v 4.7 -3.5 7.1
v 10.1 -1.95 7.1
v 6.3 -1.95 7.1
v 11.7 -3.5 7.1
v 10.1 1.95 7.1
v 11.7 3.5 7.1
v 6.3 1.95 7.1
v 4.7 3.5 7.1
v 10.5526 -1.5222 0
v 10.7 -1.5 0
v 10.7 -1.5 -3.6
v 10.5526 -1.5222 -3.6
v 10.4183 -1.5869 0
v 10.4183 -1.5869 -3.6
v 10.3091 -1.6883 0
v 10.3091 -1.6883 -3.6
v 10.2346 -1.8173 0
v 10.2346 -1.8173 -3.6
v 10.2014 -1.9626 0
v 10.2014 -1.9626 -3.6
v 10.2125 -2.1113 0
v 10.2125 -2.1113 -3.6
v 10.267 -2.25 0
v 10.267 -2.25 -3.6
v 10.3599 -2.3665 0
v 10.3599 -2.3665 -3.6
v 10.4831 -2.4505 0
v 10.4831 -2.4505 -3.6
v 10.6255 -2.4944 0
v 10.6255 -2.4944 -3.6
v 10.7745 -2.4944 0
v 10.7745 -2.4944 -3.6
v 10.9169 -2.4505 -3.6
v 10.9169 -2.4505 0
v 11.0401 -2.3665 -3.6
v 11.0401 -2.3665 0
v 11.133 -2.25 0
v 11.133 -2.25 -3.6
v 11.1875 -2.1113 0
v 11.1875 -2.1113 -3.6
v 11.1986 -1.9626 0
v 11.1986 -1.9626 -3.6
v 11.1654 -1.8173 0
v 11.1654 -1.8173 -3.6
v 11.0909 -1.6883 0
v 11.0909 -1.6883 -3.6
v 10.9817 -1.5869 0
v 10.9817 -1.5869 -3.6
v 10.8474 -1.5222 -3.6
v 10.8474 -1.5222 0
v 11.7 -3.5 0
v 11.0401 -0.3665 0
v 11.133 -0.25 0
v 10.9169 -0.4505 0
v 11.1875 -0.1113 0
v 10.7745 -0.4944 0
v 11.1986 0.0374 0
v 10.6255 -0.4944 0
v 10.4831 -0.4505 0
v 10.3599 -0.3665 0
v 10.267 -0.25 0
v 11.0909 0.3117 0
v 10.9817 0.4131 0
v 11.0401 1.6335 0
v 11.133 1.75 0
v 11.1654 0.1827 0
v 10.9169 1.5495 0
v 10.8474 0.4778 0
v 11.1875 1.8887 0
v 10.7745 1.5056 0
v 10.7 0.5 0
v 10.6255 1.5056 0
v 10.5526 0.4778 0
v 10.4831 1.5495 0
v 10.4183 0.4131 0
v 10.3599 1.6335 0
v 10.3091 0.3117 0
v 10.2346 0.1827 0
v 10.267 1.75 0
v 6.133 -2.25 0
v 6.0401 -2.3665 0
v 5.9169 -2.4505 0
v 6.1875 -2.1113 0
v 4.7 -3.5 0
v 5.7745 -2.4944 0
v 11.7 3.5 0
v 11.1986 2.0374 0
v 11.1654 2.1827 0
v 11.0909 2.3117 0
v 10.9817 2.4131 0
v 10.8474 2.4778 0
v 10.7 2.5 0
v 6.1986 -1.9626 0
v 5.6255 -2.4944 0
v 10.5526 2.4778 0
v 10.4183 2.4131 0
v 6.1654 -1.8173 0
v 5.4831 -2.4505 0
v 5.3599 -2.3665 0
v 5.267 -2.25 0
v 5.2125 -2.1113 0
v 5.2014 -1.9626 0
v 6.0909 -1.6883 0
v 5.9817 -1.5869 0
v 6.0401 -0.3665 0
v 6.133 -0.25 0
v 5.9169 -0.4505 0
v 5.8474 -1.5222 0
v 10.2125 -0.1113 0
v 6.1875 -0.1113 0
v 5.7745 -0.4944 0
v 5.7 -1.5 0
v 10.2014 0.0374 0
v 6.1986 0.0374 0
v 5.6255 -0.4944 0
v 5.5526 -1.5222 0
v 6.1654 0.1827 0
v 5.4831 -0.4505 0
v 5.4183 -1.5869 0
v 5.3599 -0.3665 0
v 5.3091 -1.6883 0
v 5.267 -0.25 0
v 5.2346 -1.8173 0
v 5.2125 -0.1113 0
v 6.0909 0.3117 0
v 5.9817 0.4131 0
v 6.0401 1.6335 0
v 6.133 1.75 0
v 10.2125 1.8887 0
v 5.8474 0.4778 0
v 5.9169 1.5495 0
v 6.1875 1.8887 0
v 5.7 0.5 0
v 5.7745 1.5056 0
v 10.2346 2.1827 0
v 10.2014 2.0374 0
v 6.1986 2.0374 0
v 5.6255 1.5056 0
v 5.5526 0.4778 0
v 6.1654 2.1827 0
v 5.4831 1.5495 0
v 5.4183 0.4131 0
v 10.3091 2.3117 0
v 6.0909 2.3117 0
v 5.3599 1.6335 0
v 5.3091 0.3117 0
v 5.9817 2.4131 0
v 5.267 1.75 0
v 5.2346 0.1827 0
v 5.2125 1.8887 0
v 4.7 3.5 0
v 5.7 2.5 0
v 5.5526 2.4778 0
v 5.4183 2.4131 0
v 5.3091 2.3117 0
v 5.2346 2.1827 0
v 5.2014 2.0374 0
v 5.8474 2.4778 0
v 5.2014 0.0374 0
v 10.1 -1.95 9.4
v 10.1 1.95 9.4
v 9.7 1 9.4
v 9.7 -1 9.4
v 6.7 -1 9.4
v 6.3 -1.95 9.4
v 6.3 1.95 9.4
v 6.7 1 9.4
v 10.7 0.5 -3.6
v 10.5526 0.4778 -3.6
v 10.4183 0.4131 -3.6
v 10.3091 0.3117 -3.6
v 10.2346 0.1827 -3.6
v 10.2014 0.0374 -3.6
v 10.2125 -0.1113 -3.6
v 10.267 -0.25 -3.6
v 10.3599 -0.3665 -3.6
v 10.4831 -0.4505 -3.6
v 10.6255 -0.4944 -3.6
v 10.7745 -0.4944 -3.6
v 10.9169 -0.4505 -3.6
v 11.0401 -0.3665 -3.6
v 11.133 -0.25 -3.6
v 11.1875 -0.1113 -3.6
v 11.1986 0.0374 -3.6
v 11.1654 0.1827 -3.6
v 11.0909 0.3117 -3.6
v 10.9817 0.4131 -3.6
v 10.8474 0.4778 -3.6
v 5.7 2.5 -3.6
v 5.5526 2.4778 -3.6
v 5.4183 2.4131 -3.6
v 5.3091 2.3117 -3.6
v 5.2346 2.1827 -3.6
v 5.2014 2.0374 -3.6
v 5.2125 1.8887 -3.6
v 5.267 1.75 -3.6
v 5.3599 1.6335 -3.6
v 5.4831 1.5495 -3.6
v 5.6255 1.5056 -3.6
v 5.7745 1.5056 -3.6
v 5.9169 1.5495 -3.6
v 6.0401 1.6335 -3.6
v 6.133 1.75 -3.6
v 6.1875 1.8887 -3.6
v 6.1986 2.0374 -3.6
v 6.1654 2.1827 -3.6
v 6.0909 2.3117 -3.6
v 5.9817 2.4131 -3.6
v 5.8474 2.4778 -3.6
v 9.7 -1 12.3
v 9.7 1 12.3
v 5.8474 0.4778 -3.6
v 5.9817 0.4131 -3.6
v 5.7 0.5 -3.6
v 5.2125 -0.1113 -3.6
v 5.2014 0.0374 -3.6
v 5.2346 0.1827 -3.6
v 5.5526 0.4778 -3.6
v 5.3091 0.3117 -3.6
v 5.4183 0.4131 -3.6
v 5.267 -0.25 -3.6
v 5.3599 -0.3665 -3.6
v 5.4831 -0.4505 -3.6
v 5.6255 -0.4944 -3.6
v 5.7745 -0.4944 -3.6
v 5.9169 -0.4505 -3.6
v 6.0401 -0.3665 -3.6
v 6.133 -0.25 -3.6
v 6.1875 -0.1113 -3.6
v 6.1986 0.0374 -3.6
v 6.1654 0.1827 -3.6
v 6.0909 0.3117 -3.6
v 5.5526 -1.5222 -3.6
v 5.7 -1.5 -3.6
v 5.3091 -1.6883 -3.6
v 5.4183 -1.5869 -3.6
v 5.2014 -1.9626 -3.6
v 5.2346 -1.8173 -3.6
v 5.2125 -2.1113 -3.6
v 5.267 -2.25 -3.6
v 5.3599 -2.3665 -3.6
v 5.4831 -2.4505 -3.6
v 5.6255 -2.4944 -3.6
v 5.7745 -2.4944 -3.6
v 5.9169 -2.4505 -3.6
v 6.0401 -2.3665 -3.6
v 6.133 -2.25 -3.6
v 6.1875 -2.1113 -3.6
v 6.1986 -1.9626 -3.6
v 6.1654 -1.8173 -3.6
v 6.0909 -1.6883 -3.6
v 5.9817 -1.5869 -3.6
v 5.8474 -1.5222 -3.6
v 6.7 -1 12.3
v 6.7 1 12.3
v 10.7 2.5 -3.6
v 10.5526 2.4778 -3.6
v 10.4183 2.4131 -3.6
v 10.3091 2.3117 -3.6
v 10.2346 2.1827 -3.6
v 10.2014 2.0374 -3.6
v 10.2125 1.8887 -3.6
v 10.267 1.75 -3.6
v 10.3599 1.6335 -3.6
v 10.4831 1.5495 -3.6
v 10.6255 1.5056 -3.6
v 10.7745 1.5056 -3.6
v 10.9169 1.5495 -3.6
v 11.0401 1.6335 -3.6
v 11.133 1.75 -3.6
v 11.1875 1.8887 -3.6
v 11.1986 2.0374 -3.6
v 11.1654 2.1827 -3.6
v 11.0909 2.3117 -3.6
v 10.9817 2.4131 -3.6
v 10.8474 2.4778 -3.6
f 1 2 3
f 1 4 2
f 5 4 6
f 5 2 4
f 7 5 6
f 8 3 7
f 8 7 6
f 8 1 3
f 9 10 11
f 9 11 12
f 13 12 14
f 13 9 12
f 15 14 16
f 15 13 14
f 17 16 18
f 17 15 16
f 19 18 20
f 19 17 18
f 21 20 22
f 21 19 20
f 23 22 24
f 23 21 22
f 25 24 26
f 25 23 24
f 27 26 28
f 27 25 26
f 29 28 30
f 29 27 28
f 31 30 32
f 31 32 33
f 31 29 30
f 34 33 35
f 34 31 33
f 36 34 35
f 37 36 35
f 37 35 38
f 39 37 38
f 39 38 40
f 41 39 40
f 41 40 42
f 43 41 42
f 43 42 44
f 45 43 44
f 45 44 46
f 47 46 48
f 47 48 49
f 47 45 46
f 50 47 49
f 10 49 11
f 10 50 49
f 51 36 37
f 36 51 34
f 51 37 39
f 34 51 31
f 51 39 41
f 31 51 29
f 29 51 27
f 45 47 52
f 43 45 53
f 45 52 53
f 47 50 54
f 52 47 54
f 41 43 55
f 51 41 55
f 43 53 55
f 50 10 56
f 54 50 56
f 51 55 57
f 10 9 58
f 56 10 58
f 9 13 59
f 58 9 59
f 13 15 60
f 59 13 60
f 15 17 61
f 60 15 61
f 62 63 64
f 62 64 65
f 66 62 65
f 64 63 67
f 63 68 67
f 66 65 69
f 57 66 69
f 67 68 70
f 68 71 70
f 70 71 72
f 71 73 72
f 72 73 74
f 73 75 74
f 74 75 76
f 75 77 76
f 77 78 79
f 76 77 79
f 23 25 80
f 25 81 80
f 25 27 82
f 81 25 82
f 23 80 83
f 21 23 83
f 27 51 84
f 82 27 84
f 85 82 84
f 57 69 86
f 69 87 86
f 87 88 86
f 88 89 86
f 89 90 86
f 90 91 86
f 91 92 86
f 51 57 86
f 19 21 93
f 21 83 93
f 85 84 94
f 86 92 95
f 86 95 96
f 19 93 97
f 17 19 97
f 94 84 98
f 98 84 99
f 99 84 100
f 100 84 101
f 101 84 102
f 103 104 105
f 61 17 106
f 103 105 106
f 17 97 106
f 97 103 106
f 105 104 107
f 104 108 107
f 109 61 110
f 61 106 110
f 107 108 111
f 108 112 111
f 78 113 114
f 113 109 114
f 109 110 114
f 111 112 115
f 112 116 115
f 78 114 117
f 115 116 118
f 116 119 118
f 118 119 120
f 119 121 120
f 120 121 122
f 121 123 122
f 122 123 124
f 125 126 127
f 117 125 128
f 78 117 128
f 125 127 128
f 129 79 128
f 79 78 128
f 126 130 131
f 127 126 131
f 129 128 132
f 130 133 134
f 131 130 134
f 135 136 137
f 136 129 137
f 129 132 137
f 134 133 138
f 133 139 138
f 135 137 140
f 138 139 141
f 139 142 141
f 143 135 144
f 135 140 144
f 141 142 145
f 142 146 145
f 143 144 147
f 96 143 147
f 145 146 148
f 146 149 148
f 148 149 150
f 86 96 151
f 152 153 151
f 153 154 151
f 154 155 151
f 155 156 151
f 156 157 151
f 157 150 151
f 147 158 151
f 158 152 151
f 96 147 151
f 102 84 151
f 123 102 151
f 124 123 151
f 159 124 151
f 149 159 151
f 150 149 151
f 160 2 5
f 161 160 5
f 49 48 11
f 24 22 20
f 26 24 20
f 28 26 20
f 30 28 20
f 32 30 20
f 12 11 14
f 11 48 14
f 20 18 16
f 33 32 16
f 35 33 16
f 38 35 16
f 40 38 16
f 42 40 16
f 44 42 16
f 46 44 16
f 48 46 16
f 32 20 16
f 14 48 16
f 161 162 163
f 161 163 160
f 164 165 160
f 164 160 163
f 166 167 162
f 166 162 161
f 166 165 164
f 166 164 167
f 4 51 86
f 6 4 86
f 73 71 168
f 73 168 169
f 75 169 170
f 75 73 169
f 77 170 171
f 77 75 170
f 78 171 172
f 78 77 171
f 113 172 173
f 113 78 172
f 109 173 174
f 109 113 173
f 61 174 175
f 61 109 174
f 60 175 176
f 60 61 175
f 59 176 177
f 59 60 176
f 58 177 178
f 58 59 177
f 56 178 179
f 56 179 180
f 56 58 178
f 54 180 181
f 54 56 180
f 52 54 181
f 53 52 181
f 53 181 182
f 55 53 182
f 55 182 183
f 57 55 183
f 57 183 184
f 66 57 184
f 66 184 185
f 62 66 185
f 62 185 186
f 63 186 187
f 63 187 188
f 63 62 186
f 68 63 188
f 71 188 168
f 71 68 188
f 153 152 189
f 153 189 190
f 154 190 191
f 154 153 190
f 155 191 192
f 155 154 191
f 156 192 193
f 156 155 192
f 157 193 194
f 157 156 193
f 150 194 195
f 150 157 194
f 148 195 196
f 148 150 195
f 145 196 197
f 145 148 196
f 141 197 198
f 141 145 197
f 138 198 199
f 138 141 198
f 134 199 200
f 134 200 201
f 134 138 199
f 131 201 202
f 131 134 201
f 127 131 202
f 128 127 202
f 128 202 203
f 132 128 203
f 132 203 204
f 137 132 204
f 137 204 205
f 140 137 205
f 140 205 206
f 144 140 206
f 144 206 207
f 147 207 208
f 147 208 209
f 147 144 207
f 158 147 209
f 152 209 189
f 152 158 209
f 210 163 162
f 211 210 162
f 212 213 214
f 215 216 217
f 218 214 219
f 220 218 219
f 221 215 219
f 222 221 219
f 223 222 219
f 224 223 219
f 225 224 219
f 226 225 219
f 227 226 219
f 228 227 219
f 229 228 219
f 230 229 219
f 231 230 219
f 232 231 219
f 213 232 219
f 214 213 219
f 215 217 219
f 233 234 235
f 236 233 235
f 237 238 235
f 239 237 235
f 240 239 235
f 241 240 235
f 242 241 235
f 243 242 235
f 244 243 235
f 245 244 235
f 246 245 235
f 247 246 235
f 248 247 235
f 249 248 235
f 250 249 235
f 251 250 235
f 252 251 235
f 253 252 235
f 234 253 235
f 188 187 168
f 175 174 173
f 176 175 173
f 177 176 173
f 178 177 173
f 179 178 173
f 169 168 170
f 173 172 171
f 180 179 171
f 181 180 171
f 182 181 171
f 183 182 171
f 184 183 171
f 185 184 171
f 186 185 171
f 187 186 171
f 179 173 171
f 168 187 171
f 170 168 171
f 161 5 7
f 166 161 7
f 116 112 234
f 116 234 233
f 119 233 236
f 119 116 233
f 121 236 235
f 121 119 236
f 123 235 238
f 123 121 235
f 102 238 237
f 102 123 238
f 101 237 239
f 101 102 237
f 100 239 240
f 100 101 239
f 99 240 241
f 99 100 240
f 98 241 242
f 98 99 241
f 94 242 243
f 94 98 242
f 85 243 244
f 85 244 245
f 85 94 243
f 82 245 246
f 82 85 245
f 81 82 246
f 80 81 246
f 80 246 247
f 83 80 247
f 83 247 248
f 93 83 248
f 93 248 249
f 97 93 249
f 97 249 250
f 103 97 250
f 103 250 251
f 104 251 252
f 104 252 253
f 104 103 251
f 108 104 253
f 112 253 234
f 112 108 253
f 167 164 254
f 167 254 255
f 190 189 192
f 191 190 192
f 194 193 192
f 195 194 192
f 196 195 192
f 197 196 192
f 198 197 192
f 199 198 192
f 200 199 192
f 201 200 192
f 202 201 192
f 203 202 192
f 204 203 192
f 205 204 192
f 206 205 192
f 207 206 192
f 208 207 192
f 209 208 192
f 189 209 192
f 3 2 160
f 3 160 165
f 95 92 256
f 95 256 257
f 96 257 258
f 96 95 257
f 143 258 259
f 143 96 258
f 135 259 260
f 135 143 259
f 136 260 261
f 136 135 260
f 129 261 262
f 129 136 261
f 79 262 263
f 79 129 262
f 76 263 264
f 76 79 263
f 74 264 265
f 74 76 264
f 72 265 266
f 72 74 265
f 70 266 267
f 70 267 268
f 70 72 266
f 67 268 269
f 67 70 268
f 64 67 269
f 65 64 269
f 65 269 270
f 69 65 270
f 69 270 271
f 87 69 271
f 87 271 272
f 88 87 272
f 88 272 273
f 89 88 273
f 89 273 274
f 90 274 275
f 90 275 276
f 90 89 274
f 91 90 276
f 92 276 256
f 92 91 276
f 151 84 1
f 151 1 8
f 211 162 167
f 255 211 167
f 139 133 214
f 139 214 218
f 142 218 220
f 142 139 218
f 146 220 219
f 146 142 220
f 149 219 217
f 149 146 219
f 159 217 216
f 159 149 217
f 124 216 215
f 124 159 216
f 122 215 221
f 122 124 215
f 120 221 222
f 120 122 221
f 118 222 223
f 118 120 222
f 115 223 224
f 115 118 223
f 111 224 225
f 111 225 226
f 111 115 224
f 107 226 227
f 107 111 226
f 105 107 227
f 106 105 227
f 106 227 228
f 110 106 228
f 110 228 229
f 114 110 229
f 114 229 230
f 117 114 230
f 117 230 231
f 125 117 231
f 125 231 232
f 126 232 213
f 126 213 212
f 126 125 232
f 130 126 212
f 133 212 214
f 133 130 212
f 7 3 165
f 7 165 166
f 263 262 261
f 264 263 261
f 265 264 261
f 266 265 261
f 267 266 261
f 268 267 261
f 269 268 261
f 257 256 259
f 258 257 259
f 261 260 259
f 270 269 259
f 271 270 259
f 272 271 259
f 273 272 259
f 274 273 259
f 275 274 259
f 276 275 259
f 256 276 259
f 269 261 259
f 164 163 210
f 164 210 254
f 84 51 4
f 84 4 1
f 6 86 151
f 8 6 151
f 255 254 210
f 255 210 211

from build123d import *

# Parameters (mm, degrees)
SKETCH069_W             = 7
SKETCH069_H             = 7
PAD039_DEPTH            = 7.1
SKETCH070_R             = 0.5
PAD040_DEPTH            = 3.6
SKETCH071_W             = 3.9
SKETCH071_H             = 3.8
PAD041_DEPTH            = 9.4
SKETCH072_W             = 2
SKETCH072_H             = 3
PAD042_DEPTH            = 12.3
BODY057_PLACEMENT_ANGLE = 90


with BuildPart() as part:
    # Sketch069 → Pad039 (new body)
    with BuildSketch(Plane.XY):
        Rectangle(SKETCH069_W, SKETCH069_H)
    extrude(amount=PAD039_DEPTH)

    # Sketch070 → Pad040 (join)
    with BuildSketch(Plane.XY):
        with Locations((0, 2.5)):
            Circle(SKETCH070_R)
        with Locations((0, -2.5)):
            Circle(SKETCH070_R)
        with Locations((2, 2.5)):
            Circle(SKETCH070_R)
        with Locations((-2, 2.5)):
            Circle(SKETCH070_R)
        with Locations((-2, -2.5)):
            Circle(SKETCH070_R)
        with Locations((2, -2.5)):
            Circle(SKETCH070_R)
    extrude(amount=-PAD040_DEPTH)

    # Sketch071 → Pad041 (join)
    with BuildSketch(Plane.XY):
        Rectangle(SKETCH071_W, SKETCH071_H)
    extrude(amount=PAD041_DEPTH)

    # Sketch072 → Pad042 (join)
    with BuildSketch(Plane.XY):
        Rectangle(SKETCH072_W, SKETCH072_H)
    extrude(amount=PAD042_DEPTH)


with BuildPart() as part_1:
    # Body057 placement: moved
    add(part.part.moved(Location((8.2, 0, 0))).rotate(Axis((8.2, 0, 0), (0, 0, 1)), BODY057_PLACEMENT_ANGLE))


solid = part_1.part
